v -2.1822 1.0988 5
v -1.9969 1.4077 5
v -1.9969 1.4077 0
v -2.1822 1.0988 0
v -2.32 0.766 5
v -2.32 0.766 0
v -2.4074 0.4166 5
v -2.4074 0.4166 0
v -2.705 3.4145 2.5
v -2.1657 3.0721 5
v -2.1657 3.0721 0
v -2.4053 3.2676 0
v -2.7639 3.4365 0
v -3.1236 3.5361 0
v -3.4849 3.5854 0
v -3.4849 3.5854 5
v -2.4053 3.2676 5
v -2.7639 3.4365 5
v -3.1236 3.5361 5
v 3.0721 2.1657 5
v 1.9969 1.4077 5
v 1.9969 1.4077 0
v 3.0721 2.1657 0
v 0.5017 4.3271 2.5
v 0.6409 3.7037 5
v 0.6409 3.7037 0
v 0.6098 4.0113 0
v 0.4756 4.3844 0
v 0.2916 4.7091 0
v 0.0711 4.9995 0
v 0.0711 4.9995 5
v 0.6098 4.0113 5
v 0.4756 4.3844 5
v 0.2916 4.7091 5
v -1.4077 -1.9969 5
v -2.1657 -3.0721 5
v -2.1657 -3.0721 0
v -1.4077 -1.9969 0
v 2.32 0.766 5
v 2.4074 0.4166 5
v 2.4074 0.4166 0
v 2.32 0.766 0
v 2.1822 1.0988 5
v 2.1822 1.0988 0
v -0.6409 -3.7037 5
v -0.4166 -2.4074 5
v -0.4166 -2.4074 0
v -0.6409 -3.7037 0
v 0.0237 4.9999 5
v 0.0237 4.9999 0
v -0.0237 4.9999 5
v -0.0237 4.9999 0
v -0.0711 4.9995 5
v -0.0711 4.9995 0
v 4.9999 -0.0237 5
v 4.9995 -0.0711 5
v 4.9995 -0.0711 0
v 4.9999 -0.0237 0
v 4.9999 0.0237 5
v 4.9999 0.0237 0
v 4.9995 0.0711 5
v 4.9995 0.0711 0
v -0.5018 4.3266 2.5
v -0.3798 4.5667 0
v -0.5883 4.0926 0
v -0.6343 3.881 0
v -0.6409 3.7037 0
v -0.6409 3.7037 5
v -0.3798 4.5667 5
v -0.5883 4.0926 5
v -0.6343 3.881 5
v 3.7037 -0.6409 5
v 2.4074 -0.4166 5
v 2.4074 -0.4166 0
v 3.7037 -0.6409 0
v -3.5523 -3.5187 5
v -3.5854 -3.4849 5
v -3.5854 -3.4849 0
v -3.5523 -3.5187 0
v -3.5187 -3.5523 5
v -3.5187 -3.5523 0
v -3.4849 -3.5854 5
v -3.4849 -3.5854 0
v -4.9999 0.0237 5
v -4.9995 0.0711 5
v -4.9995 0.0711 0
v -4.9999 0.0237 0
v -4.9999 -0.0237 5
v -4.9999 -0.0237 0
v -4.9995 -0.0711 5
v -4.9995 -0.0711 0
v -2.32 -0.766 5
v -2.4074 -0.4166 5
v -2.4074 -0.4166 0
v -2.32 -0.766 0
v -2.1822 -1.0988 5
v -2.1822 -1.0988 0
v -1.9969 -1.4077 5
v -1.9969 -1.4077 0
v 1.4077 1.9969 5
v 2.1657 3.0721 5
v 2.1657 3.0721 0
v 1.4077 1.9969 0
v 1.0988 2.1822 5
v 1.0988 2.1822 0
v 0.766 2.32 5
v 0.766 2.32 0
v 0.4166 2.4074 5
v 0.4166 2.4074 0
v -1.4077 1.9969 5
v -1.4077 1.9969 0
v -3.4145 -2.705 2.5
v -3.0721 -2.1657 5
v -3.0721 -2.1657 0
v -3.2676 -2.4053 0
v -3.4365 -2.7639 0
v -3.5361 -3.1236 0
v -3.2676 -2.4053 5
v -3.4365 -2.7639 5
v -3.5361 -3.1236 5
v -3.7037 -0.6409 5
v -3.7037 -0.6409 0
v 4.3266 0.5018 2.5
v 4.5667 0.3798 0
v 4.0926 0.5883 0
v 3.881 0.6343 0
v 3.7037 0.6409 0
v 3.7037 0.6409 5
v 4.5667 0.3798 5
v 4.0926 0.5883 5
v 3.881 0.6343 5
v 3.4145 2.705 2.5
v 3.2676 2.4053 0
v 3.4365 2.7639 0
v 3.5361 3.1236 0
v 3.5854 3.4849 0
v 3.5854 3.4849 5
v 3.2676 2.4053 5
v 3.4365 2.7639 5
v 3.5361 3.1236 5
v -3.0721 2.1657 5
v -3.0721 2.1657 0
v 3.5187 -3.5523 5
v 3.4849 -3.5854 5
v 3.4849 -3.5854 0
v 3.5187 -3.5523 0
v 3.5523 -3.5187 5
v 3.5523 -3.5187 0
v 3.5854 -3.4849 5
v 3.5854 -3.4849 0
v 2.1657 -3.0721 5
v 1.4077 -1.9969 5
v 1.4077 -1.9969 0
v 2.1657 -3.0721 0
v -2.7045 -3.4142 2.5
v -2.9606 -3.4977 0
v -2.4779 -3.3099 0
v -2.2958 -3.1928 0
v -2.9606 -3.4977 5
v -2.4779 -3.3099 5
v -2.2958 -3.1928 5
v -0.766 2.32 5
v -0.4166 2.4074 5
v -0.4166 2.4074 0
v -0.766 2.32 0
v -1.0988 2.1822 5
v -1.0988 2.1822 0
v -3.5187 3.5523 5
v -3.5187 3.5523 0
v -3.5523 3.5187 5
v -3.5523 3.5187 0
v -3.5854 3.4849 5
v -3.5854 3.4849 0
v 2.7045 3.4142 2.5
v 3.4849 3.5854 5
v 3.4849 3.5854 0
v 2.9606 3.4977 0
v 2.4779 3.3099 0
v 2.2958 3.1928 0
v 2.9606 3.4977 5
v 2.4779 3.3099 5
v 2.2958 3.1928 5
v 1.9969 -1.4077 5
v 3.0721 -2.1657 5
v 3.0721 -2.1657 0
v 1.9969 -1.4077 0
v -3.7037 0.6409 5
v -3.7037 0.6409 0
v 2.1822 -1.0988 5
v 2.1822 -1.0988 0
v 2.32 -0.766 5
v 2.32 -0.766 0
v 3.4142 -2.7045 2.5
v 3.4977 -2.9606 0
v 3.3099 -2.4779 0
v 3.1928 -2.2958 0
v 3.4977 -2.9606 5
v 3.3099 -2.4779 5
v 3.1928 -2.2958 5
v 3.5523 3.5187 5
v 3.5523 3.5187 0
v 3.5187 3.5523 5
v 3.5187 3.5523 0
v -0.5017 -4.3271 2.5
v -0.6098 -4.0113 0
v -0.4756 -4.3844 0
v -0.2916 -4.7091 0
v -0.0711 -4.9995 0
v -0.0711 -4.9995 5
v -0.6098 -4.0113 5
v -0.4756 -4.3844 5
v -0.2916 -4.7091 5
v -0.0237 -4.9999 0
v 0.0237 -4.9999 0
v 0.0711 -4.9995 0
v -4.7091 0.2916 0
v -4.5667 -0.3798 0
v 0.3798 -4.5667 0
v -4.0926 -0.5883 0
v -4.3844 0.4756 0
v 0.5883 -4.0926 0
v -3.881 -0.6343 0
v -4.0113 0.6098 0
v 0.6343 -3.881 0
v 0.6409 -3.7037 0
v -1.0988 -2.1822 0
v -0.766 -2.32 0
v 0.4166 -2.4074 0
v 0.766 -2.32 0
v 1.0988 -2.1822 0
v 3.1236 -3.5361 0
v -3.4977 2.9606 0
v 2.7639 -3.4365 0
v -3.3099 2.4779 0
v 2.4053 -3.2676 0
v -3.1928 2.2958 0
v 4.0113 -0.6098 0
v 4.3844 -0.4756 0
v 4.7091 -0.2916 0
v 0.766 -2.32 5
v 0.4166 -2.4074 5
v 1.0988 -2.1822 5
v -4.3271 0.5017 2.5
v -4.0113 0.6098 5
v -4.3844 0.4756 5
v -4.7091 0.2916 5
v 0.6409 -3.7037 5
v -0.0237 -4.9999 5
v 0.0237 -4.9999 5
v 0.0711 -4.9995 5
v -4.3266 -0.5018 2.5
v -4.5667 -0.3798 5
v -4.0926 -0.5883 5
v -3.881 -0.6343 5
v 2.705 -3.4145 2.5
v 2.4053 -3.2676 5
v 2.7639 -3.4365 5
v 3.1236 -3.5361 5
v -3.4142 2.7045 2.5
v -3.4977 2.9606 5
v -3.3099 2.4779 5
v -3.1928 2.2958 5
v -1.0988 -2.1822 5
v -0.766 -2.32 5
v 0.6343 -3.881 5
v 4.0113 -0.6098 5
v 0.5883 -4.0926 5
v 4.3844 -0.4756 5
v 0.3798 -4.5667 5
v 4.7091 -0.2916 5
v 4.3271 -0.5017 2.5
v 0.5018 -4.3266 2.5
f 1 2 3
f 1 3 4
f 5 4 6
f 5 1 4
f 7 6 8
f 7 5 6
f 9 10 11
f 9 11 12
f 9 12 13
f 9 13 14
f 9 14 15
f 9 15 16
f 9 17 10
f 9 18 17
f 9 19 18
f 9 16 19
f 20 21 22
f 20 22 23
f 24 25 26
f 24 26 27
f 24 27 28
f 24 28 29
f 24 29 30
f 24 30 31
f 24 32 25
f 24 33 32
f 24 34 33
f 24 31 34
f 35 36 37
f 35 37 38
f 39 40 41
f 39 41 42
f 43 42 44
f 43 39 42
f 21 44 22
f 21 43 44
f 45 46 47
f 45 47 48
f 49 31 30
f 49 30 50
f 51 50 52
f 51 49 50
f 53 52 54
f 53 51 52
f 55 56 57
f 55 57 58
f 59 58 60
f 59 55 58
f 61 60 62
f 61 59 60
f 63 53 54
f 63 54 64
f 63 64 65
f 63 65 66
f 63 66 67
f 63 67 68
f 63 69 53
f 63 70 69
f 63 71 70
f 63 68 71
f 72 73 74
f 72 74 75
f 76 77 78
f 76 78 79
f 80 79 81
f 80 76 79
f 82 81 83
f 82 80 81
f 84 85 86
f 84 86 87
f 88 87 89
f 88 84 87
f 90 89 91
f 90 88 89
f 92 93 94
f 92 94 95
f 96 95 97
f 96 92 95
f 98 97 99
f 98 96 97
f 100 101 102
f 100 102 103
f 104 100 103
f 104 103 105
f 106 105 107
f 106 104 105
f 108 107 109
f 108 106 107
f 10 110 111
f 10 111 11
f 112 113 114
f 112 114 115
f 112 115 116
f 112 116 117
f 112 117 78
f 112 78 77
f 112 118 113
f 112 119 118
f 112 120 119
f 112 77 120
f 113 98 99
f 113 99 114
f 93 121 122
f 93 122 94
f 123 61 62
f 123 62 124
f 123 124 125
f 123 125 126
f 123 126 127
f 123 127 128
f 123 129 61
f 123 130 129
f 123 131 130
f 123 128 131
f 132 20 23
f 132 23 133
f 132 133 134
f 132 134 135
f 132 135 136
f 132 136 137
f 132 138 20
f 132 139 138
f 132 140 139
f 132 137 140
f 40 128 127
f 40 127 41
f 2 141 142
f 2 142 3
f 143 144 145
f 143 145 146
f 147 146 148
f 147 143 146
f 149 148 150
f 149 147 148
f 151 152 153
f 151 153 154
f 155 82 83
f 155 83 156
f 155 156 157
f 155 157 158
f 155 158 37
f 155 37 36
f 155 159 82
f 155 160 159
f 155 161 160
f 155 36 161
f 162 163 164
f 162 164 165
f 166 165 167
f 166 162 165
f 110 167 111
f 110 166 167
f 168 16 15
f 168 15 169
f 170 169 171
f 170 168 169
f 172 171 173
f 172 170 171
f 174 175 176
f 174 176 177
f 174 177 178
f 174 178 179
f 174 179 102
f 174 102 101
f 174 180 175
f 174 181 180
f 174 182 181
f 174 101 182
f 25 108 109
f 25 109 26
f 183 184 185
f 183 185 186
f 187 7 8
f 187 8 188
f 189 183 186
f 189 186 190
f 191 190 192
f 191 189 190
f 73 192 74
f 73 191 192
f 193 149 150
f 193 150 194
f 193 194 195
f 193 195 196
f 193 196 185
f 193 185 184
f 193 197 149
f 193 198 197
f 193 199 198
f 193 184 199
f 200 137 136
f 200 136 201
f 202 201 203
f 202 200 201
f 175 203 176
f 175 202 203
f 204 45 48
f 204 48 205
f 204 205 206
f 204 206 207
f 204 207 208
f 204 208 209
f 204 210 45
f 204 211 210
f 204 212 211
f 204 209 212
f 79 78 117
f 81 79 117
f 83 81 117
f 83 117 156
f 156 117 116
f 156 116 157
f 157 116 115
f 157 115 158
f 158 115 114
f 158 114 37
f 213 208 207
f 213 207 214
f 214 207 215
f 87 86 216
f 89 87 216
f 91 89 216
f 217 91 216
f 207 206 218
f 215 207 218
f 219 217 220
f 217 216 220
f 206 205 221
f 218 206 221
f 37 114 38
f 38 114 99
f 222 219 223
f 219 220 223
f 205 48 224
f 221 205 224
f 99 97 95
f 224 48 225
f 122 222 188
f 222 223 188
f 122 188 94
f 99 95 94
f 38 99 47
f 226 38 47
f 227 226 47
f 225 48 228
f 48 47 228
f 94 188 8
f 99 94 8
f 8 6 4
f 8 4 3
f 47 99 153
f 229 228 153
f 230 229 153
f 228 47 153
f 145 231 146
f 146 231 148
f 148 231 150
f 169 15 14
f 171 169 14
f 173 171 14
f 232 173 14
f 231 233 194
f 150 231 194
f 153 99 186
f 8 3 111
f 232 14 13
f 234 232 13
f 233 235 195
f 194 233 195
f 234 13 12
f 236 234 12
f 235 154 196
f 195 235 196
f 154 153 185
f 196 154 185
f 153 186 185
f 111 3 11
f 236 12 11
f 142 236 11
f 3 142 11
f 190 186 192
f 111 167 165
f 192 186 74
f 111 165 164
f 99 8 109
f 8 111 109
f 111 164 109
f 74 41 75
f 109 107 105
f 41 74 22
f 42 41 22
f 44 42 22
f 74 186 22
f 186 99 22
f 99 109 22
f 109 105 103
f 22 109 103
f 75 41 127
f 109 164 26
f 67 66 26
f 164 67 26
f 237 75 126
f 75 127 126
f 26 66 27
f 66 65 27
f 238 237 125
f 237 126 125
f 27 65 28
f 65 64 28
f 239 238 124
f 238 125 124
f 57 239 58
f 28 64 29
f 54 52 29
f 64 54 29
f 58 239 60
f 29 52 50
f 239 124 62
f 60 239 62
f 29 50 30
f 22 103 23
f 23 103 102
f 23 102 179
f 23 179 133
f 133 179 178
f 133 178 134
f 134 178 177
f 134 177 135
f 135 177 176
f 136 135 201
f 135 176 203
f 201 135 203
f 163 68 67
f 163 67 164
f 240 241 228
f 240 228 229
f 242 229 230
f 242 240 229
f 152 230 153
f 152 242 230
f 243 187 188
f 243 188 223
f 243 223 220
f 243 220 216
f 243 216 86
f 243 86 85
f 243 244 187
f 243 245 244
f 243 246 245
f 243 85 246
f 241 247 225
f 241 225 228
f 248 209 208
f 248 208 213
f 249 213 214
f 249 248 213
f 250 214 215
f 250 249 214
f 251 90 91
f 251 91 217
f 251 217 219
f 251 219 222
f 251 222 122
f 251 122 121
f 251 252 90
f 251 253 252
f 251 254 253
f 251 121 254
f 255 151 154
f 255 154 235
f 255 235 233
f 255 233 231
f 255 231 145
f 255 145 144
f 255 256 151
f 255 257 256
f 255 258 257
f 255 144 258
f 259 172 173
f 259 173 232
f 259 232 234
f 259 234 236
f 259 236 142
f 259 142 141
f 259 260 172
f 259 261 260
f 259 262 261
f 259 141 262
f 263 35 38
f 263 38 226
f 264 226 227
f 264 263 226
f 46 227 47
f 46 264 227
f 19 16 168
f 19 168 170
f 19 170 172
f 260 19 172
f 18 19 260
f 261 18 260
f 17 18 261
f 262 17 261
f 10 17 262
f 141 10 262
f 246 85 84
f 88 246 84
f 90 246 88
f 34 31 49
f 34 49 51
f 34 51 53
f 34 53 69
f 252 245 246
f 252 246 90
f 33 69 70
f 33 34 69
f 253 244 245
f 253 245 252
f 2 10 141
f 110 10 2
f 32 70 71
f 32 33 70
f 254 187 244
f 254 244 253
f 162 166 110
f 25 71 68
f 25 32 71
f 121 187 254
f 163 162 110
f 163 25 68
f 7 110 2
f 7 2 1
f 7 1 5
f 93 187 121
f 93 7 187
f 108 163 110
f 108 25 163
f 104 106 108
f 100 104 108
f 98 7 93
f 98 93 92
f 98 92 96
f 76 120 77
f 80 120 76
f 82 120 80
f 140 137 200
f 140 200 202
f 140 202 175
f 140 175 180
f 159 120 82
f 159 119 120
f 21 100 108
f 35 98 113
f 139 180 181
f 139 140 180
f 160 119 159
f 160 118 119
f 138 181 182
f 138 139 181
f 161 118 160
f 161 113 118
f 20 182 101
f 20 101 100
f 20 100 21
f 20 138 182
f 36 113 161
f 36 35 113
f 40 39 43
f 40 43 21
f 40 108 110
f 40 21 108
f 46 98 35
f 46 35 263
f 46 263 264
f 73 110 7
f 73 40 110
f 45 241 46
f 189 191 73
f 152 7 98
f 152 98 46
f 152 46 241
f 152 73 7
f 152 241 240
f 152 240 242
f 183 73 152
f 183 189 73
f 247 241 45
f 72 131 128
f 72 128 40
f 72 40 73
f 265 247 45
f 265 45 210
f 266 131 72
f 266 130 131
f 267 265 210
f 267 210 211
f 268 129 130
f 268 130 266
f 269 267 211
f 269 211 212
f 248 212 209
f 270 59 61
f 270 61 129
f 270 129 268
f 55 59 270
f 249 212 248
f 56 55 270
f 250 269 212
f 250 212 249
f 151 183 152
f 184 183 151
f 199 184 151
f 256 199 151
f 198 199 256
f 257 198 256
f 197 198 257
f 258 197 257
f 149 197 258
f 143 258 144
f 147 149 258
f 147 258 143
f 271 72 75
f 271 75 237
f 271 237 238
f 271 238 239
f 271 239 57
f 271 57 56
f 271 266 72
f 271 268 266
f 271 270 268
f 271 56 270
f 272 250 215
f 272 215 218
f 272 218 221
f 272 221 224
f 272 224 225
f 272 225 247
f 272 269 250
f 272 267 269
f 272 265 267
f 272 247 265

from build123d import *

# Parameters (mm, degrees)
BOSS_EXTRUDE1_DEPTH = 5
CIRPATTERN1_COUNT   = 8
SKETCH2_R           = 2.443200814
BOSS_EXTRUDE2_DEPTH = 5


with BuildPart() as part:
    # Sketch1 → Boss-Extrude1 (new body)
    with BuildSketch(Plane.XY.offset(5)):
        with BuildLine():
            Line((0.41659025, 2.407422435), (0.640908077, 3.703726823))
            add(Edge.make_bspline(
                [(0.640908077, 3.703726823), (0.680350197, 4.297153912), (0.071093186, 4.99949455)],
                knots=[0.50407462, 0.50407462, 0.50407462, 1.738238777, 1.738238777, 1.738238777], degree=2, weights=[1, 0.815570405, 1]))
            ThreePointArc((0.071093186, 4.99949455), (0, 5), (-0.071093186, 4.99949455))
            add(Edge.make_bspline(
                [(-0.071093186, 4.99949455), (-0.684119659, 4.29533983), (-0.640908077, 3.703726823)],
                knots=[4.493136736, 4.493136736, 4.493136736, 5.781201385, 5.781201385, 5.781201385], degree=2, weights=[1, 0.799681158, 1]))
            Line((-0.640908077, 3.703726823), (-0.41659025, 2.407422435))
            Line((-0.41659025, 2.407422435), (0.41659025, 2.407422435))
        make_face()
    extrude(amount=-BOSS_EXTRUDE1_DEPTH)


with BuildPart() as cirpattern1_1:
    # CirPattern1: pattern copy
    add(part.part.rotate(Axis((0, 0, 0), (0, 0, 1)), 1 * 360 / CIRPATTERN1_COUNT))


with BuildPart() as cirpattern1_2:
    # CirPattern1: pattern copy
    add(part.part.rotate(Axis((0, 0, 0), (0, 0, 1)), 2 * 360 / CIRPATTERN1_COUNT))


with BuildPart() as cirpattern1_3:
    # CirPattern1: pattern copy
    add(part.part.rotate(Axis((0, 0, 0), (0, 0, 1)), 3 * 360 / CIRPATTERN1_COUNT))


with BuildPart() as cirpattern1_4:
    # CirPattern1: pattern copy
    add(part.part.rotate(Axis((0, 0, 0), (0, 0, 1)), 4 * 360 / CIRPATTERN1_COUNT))


with BuildPart() as cirpattern1_5:
    # CirPattern1: pattern copy
    add(part.part.rotate(Axis((0, 0, 0), (0, 0, 1)), 5 * 360 / CIRPATTERN1_COUNT))


with BuildPart() as cirpattern1_6:
    # CirPattern1: pattern copy
    add(part.part.rotate(Axis((0, 0, 0), (0, 0, 1)), 6 * 360 / CIRPATTERN1_COUNT))


with BuildPart() as cirpattern1_7:
    # CirPattern1: pattern copy
    add(part.part.rotate(Axis((0, 0, 0), (0, 0, 1)), 7 * 360 / CIRPATTERN1_COUNT))


with BuildPart() as part_1:
    add(part.part)

    add(cirpattern1_1.part)  # Boss-Extrude2 merges CirPattern1_1

    add(cirpattern1_2.part)  # Boss-Extrude2 merges CirPattern1_2

    add(cirpattern1_3.part)  # Boss-Extrude2 merges CirPattern1_3

    add(cirpattern1_4.part)  # Boss-Extrude2 merges CirPattern1_4

    add(cirpattern1_5.part)  # Boss-Extrude2 merges CirPattern1_5

    add(cirpattern1_6.part)  # Boss-Extrude2 merges CirPattern1_6

    add(cirpattern1_7.part)  # Boss-Extrude2 merges CirPattern1_7
    # Sketch2 → Boss-Extrude2 (add)
    with BuildSketch(Plane.XY.offset(5)):
        Circle(SKETCH2_R)
    extrude(amount=-BOSS_EXTRUDE2_DEPTH)


solid = part_1.part
